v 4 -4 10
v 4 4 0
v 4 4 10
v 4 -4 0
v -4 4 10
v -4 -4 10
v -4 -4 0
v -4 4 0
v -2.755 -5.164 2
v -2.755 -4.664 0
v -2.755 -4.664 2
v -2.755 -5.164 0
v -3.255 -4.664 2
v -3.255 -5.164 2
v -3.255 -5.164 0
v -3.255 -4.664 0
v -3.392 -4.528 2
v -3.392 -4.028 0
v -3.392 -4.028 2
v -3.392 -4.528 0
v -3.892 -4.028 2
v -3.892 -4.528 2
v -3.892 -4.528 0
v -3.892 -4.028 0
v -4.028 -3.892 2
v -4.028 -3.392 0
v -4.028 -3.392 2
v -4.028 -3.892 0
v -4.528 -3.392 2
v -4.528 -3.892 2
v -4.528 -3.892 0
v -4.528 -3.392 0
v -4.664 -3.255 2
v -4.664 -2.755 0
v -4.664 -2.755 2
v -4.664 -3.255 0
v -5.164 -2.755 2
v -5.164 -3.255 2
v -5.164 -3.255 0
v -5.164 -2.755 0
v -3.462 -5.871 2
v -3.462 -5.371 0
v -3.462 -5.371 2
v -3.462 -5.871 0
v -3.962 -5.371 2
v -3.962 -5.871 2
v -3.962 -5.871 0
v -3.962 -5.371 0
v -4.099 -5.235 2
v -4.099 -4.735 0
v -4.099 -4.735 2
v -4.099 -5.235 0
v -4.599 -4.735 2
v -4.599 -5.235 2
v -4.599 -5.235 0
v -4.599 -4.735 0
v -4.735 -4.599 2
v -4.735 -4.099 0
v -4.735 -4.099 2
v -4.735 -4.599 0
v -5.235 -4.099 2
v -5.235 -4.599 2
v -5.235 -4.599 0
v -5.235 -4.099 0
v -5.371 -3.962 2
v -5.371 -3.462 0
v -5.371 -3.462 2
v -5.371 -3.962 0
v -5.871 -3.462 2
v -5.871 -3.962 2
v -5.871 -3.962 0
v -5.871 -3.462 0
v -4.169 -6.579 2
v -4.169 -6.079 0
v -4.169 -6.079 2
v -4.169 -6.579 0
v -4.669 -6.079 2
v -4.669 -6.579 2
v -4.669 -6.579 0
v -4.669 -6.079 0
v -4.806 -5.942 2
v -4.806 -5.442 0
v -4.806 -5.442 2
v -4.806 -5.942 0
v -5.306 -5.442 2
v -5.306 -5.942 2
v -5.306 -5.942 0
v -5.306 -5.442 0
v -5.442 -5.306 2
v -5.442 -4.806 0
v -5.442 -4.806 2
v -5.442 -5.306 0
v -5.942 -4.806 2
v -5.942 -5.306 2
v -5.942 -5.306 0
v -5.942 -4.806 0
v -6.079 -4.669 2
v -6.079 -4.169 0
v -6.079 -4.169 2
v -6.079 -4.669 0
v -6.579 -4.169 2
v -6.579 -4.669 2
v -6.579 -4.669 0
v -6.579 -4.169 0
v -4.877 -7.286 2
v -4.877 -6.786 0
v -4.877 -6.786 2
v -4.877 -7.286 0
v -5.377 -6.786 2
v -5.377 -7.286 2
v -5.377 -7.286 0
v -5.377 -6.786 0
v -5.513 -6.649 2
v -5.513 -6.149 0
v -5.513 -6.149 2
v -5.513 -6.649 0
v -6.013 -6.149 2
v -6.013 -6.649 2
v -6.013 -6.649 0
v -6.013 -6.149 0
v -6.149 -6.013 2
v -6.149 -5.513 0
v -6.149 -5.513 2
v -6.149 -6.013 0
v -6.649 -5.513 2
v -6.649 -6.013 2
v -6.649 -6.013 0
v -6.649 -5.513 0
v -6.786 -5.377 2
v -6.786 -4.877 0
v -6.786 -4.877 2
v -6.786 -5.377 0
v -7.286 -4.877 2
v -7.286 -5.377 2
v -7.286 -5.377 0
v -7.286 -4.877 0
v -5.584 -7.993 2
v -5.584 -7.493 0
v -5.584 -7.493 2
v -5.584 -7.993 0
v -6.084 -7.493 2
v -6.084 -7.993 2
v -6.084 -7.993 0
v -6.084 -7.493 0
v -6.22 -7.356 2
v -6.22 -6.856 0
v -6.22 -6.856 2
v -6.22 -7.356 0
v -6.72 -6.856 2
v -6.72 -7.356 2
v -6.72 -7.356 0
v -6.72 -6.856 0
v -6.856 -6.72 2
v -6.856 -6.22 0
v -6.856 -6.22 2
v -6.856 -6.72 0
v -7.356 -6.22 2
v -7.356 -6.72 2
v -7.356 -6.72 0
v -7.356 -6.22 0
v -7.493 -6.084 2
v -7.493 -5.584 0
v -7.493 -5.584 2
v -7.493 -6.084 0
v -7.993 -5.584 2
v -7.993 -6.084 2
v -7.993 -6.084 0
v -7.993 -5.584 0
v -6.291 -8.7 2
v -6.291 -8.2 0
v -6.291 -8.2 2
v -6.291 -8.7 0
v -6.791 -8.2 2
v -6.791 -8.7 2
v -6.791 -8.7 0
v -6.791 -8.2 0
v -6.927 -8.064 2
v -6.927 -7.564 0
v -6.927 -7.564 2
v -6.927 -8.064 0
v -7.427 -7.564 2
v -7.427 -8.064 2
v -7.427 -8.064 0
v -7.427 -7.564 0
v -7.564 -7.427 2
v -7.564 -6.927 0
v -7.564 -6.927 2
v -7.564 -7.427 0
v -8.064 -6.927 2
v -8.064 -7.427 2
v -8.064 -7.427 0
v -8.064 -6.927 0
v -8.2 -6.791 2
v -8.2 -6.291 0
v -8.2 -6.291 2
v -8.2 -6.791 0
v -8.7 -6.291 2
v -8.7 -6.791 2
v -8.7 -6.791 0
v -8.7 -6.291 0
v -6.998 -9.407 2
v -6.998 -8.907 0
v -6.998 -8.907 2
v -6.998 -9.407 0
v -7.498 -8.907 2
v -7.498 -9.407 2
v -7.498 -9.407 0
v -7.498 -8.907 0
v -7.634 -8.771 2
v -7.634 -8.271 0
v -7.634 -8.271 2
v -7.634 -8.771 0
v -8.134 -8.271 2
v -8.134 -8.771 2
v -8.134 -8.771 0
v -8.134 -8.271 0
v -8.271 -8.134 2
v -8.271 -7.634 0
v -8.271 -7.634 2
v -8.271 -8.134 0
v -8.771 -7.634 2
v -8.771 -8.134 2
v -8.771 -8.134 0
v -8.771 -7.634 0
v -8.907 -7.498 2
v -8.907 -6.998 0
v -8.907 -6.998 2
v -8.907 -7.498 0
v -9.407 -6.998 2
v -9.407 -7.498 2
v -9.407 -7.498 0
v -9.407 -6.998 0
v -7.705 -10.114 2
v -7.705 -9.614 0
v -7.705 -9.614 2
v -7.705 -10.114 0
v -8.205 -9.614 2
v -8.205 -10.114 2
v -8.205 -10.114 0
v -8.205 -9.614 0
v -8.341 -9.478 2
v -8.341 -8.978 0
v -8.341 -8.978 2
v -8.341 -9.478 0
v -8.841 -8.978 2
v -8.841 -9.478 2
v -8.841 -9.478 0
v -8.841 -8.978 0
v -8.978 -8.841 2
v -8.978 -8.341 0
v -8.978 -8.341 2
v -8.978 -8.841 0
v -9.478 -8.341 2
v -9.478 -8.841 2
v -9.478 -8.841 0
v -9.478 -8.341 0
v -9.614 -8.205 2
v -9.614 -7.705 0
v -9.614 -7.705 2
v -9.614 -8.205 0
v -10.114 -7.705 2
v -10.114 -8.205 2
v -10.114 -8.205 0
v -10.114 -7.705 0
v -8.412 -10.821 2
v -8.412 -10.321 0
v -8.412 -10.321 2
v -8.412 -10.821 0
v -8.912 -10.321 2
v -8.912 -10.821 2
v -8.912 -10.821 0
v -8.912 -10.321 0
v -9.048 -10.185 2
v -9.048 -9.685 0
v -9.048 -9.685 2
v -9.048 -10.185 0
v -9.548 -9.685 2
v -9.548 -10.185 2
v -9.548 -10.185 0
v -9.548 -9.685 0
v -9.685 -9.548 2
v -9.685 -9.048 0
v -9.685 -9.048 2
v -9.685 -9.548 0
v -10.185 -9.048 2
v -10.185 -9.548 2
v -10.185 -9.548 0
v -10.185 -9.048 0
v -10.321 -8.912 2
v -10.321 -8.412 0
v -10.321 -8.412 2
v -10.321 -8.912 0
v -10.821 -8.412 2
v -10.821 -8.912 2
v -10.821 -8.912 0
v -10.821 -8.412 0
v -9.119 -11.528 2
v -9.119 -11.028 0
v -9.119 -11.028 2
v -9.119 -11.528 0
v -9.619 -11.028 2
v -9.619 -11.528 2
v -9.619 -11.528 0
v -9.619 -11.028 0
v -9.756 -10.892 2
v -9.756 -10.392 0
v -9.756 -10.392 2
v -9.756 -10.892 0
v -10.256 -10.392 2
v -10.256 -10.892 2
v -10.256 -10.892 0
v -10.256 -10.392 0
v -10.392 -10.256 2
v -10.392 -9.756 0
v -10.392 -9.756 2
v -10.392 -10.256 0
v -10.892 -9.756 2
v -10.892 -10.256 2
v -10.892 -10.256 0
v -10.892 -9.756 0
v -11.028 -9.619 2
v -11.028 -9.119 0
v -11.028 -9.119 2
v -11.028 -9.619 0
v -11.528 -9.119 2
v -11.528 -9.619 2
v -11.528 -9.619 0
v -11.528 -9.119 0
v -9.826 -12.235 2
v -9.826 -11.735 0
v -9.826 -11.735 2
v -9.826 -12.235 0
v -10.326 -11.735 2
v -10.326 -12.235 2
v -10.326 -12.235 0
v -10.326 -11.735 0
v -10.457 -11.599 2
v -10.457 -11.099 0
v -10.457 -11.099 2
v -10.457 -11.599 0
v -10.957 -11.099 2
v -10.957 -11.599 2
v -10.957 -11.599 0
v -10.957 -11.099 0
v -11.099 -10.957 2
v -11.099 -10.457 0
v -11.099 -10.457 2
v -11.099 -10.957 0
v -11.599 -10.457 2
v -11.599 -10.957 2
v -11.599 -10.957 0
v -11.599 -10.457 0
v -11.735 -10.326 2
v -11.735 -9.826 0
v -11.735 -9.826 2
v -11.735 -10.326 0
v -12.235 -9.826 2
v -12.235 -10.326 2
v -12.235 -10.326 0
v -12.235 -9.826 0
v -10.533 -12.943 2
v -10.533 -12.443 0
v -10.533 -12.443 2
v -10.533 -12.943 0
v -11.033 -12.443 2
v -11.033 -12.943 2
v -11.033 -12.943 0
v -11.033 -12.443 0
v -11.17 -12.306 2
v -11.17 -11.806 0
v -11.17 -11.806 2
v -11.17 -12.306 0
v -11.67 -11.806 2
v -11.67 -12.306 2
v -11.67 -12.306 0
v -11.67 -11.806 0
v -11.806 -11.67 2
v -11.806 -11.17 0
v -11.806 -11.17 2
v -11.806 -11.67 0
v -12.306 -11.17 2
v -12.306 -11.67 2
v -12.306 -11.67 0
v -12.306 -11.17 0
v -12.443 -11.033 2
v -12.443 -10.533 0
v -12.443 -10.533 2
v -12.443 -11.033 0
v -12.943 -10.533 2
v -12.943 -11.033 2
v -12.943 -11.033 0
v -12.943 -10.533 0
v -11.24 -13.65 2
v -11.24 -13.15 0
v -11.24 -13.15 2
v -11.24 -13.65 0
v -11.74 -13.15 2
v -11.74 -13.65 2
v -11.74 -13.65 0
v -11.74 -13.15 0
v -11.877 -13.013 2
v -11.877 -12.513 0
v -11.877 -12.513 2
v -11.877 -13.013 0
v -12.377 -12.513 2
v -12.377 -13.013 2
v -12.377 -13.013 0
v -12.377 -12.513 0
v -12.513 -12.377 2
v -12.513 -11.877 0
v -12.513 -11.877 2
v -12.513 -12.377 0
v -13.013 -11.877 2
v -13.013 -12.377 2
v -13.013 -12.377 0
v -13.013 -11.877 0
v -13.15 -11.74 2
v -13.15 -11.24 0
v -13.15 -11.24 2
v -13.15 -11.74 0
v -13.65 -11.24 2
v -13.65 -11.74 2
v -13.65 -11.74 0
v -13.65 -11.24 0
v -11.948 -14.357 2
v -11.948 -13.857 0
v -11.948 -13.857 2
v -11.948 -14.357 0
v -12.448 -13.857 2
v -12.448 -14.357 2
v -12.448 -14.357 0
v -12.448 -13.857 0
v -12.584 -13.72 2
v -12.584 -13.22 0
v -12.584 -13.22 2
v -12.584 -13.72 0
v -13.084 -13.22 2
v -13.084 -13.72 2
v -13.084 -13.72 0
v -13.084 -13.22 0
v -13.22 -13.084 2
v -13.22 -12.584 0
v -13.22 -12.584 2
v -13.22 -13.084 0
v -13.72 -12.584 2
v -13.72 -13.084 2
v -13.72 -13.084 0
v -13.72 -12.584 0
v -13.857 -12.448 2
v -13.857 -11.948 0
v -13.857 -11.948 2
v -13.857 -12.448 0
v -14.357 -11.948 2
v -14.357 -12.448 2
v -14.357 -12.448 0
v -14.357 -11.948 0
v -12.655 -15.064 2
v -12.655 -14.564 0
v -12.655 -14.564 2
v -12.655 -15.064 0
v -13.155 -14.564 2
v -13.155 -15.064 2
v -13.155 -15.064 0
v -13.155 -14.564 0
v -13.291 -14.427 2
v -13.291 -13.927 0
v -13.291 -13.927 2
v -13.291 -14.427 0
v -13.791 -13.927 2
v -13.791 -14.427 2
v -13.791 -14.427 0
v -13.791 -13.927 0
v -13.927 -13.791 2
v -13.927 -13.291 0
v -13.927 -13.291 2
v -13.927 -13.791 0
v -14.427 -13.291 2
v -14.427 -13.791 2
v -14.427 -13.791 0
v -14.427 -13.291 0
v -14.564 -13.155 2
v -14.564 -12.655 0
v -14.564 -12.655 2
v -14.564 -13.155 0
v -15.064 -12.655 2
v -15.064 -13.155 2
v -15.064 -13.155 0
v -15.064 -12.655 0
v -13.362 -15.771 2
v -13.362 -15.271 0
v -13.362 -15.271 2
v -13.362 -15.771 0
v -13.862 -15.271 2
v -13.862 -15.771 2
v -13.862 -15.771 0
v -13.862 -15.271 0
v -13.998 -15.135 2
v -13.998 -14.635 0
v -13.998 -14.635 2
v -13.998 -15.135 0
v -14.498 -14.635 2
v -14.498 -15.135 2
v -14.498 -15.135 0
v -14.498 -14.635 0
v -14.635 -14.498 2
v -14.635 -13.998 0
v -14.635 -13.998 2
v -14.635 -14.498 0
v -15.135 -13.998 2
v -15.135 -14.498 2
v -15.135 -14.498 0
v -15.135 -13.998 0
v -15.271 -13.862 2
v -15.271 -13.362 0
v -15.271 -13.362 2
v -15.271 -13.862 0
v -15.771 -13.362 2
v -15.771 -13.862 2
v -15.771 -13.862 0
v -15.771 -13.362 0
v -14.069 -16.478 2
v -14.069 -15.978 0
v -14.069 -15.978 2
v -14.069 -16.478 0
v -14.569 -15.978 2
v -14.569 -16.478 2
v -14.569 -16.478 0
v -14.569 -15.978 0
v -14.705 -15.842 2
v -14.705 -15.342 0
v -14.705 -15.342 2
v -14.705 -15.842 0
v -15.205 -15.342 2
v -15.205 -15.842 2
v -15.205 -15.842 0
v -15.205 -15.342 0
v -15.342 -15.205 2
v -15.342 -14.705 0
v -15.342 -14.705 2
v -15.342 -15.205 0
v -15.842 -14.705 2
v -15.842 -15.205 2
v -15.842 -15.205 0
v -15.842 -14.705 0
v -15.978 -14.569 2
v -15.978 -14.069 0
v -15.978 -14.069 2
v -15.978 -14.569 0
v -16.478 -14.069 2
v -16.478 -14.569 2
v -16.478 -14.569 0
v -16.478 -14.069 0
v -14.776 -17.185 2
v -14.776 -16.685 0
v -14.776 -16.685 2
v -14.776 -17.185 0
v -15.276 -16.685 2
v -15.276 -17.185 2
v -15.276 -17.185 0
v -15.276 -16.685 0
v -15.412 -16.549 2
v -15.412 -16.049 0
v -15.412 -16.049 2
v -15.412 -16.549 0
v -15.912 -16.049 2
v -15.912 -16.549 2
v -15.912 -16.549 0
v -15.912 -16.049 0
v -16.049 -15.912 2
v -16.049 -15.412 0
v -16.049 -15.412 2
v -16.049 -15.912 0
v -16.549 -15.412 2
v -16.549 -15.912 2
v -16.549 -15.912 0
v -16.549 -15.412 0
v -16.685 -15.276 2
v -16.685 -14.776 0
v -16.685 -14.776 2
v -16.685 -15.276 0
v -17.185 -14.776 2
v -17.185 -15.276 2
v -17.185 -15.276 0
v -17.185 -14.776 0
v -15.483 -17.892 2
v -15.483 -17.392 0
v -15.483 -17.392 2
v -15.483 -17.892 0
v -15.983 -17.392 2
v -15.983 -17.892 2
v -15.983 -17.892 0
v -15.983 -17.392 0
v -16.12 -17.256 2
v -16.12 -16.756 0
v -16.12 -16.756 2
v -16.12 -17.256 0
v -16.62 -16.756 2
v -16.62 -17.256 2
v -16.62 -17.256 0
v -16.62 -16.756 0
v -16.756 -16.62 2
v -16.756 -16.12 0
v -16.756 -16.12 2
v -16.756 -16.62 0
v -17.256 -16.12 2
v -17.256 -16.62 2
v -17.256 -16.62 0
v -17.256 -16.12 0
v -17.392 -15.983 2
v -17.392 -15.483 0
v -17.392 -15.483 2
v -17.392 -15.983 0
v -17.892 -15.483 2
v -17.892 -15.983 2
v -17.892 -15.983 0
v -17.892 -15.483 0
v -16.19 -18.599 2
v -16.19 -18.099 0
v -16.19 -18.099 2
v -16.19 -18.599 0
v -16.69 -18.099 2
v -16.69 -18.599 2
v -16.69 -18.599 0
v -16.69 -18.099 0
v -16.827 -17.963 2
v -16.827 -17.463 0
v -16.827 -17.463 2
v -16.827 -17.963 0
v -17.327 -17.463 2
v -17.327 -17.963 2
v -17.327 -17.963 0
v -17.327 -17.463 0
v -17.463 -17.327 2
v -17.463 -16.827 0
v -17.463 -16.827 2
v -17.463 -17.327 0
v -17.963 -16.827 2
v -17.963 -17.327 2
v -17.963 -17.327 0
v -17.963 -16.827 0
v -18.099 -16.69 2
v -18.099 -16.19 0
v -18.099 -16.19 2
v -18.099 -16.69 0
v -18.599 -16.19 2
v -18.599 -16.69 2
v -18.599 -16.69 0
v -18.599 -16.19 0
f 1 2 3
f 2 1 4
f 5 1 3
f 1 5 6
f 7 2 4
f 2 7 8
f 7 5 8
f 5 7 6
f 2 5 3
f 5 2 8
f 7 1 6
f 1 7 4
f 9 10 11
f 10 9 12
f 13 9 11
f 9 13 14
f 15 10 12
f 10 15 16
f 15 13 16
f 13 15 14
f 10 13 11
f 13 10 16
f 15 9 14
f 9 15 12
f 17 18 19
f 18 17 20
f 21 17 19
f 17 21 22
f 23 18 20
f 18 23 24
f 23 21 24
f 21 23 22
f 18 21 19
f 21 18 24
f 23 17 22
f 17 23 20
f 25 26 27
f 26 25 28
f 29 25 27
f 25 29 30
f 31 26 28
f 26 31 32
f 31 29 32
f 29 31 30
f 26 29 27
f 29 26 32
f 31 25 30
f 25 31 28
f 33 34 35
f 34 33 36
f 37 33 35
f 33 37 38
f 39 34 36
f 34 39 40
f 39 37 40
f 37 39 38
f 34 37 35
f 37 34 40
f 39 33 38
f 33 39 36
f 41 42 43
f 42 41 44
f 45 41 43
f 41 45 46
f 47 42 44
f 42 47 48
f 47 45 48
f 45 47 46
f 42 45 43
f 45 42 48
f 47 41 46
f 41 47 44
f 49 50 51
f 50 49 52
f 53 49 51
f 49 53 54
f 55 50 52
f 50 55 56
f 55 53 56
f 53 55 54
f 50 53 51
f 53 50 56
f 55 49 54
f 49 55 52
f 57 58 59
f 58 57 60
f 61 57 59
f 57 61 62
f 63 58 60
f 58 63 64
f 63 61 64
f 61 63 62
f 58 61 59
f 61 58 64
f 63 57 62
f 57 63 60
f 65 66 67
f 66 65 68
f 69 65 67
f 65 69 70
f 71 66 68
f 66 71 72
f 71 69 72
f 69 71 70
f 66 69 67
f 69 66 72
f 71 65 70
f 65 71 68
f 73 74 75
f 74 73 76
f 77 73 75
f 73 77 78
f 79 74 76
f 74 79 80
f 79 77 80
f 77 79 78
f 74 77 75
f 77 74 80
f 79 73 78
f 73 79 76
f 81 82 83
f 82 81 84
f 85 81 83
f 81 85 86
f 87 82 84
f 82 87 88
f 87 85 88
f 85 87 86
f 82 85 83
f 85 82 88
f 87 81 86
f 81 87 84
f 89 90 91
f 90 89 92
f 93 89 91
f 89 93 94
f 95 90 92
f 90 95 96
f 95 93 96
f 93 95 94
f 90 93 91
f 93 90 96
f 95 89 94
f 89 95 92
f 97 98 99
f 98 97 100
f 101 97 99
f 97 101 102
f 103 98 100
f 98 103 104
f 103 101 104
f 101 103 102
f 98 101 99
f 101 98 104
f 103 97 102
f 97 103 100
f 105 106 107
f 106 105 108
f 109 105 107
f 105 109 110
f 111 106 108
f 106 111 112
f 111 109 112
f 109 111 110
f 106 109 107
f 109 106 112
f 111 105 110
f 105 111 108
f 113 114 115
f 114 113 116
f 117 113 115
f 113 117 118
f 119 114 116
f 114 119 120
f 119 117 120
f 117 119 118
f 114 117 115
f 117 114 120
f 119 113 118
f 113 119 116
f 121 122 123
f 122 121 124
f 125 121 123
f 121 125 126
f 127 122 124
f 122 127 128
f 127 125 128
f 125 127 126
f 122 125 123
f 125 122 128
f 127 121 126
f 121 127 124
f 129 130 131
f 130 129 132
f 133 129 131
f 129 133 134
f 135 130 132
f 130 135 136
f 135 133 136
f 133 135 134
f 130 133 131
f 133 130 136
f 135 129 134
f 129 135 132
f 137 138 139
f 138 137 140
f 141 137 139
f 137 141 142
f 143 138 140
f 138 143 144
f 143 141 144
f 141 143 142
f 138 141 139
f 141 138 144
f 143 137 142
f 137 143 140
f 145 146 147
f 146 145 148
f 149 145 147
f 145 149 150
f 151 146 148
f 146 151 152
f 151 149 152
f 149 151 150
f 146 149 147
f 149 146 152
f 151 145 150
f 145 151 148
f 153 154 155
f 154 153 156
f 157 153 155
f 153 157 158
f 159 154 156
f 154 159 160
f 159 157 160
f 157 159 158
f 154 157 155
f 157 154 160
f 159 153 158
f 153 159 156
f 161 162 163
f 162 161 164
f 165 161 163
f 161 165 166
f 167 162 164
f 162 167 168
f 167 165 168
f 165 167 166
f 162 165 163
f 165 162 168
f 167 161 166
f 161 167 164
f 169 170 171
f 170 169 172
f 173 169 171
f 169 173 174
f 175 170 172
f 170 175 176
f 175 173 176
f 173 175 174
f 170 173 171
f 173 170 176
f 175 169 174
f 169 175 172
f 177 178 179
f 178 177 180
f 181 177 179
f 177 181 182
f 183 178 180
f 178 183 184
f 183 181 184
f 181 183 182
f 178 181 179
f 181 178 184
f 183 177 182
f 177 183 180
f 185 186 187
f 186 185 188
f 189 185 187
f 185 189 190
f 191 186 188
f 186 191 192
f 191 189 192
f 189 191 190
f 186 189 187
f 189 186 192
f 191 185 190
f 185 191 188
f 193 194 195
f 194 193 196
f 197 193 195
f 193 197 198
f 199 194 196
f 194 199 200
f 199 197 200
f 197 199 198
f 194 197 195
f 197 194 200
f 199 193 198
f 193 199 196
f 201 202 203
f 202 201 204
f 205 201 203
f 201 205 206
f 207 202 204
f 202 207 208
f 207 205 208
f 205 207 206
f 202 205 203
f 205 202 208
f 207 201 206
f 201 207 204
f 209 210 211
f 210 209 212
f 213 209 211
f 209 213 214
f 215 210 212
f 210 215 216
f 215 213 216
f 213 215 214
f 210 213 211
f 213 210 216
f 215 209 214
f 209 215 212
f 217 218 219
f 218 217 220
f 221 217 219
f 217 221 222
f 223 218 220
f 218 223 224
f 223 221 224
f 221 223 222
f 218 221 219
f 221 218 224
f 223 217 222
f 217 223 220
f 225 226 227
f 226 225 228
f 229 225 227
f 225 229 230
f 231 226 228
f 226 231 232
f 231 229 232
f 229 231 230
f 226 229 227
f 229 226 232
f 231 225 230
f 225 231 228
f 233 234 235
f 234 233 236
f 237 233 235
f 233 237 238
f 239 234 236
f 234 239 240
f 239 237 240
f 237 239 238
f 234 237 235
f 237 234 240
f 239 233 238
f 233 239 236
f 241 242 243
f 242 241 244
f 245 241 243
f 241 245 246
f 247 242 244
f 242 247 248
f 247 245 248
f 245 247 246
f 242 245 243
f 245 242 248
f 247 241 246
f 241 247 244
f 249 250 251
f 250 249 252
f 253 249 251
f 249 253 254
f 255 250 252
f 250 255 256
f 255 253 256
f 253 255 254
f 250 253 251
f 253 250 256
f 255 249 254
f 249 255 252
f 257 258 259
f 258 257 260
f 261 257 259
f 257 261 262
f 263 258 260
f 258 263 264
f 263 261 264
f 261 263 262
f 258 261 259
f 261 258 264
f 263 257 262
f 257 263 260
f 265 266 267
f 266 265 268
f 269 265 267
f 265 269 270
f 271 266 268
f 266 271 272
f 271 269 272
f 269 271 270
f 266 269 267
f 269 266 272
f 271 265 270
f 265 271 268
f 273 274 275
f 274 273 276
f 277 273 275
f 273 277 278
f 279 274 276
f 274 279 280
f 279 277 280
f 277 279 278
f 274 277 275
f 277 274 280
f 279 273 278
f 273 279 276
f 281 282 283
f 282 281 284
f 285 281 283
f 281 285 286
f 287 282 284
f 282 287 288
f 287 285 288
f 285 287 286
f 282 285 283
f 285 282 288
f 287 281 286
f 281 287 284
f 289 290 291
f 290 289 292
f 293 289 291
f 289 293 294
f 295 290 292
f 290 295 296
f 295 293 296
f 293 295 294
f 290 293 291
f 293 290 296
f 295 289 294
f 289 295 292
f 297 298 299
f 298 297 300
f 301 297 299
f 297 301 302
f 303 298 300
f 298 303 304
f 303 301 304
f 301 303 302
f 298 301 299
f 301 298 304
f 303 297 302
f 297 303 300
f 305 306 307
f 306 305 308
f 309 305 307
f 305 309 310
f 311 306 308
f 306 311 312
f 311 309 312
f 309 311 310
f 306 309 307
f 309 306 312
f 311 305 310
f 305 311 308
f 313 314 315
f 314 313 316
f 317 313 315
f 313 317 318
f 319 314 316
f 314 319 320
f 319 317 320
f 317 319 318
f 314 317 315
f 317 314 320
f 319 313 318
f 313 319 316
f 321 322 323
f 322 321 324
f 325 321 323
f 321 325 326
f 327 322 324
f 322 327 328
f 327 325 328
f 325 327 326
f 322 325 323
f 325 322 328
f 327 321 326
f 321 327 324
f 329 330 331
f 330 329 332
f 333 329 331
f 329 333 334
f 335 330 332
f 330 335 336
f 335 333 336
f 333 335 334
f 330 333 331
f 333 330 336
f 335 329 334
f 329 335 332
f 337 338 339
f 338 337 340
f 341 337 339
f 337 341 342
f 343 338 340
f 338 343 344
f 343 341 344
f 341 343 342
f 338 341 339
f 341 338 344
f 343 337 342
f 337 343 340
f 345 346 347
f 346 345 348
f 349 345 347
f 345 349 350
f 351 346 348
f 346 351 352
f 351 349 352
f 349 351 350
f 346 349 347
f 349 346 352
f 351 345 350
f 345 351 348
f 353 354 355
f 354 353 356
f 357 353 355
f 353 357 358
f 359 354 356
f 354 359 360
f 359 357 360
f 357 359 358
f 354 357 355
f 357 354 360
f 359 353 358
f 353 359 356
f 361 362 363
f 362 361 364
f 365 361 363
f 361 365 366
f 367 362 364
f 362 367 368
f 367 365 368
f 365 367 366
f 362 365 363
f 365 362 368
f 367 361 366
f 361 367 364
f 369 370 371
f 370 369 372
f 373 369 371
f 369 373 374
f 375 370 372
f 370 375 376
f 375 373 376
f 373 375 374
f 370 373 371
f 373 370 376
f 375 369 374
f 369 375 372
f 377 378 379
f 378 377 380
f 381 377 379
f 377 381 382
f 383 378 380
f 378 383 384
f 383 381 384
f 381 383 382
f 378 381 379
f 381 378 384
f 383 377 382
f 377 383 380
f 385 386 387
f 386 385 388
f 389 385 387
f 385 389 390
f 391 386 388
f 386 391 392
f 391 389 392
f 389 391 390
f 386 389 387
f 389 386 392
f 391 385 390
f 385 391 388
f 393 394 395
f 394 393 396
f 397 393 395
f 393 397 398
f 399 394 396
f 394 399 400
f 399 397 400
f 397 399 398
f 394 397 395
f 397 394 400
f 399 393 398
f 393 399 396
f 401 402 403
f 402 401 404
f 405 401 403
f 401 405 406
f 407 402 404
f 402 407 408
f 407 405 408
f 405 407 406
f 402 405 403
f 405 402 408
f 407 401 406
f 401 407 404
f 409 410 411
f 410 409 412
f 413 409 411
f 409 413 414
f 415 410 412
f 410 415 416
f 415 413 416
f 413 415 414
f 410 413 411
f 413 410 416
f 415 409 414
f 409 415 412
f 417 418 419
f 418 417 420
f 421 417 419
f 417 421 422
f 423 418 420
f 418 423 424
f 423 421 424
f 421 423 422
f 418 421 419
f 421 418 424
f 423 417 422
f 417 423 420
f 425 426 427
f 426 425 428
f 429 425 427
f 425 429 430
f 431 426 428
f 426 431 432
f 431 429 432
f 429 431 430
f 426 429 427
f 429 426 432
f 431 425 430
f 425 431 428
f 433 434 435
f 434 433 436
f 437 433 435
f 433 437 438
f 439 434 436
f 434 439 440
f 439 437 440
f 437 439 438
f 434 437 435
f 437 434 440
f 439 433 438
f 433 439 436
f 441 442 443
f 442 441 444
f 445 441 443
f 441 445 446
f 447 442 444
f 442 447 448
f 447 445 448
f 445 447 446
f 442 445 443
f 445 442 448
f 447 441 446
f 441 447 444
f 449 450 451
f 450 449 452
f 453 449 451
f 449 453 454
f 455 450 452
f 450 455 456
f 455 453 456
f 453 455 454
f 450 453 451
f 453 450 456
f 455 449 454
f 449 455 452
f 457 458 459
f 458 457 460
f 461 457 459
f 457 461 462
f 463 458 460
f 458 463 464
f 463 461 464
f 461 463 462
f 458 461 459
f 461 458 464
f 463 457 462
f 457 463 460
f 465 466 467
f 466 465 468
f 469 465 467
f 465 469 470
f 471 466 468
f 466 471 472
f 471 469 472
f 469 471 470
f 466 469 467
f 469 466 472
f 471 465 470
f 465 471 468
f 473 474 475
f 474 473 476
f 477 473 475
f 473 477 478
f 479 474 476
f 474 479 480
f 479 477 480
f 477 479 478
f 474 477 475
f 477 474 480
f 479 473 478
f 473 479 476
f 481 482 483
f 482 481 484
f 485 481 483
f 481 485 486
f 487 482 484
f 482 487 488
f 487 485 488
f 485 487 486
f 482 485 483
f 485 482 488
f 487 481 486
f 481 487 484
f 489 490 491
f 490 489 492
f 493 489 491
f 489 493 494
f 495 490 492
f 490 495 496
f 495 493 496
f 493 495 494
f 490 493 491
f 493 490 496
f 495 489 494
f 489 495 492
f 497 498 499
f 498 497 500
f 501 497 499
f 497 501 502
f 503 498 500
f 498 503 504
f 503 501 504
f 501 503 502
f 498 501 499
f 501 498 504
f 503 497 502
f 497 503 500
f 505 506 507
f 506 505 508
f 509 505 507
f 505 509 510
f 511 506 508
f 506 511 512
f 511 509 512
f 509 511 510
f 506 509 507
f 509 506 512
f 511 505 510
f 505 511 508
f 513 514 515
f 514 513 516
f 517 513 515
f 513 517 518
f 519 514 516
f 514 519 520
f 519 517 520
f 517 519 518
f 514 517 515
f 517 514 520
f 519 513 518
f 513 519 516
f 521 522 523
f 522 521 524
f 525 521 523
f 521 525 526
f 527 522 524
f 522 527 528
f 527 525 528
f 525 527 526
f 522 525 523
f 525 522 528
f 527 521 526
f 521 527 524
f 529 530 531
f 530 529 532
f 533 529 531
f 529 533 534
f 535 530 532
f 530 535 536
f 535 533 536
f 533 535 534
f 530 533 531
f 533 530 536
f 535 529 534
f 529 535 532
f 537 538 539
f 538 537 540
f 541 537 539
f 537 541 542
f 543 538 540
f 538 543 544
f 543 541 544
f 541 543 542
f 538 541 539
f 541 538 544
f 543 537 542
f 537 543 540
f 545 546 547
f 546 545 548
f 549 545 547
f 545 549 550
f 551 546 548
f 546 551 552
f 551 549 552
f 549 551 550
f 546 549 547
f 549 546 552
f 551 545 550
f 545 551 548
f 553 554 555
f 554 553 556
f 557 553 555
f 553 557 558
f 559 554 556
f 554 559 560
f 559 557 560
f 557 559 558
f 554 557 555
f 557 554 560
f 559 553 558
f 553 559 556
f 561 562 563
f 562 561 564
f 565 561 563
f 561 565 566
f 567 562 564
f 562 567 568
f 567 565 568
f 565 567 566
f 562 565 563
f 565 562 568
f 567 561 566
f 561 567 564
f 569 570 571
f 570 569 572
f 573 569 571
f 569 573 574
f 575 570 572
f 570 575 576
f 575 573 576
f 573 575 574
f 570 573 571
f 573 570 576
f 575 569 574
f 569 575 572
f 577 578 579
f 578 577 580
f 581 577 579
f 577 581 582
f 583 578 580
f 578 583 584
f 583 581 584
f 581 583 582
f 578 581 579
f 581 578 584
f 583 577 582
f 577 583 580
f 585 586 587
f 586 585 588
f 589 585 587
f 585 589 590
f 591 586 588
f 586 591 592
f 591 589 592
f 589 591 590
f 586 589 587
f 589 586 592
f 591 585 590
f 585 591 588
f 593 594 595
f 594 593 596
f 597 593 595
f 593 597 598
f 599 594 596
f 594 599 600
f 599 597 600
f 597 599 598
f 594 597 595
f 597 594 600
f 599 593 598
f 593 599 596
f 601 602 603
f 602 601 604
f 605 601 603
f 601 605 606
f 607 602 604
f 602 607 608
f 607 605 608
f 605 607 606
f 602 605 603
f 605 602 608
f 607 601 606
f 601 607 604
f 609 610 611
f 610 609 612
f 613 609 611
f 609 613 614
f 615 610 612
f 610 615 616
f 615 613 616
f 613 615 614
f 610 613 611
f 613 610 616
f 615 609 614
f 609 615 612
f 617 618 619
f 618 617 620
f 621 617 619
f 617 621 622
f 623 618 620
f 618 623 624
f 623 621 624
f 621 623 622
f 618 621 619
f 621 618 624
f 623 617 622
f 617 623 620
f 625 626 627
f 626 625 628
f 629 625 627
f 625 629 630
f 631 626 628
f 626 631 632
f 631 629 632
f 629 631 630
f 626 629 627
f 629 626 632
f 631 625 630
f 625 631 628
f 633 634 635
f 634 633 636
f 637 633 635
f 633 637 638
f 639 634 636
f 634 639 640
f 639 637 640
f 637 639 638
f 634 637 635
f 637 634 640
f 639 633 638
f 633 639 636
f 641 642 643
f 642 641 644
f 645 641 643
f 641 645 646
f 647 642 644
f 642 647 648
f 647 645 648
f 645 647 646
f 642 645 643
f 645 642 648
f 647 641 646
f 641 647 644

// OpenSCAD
translate([0, 0, 5]) color([0,1,0,0.9]) cube([8, 8, 10], center=true);
translate([-3.005, -4.914, 1]) color([1,0,0]) cube([0.5, 0.5, 2], center=true);
translate([-3.642, -4.278, 1]) color([1,0,0]) cube([0.5, 0.5, 2], center=true);
translate([-4.278, -3.642, 1]) color([1,0,0]) cube([0.5, 0.5, 2], center=true);
translate([-4.914, -3.005, 1]) color([1,0,0]) cube([0.5, 0.5, 2], center=true);
translate([-3.712, -5.621, 1]) color([1,0,0]) cube([0.5, 0.5, 2], center=true);
translate([-4.349, -4.985, 1]) color([1,0,0]) cube([0.5, 0.5, 2], center=true);
translate([-4.985, -4.349, 1]) color([1,0,0]) cube([0.5, 0.5, 2], center=true);
translate([-5.621, -3.712, 1]) color([1,0,0]) cube([0.5, 0.5, 2], center=true);
translate([-4.419, -6.329, 1]) color([1,0,0]) cube([0.5, 0.5, 2], center=true);
translate([-5.056, -5.692, 1]) color([1,0,0]) cube([0.5, 0.5, 2], center=true);
translate([-5.692, -5.056, 1]) color([1,0,0]) cube([0.5, 0.5, 2], center=true);
translate([-6.329, -4.419, 1]) color([1,0,0]) cube([0.5, 0.5, 2], center=true);
translate([-5.127, -7.036, 1]) color([1,0,0]) cube([0.5, 0.5, 2], center=true);
translate([-5.763, -6.399, 1]) color([1,0,0]) cube([0.5, 0.5, 2], center=true);
translate([-6.399, -5.763, 1]) color([1,0,0]) cube([0.5, 0.5, 2], center=true);
translate([-7.036, -5.127, 1]) color([1,0,0]) cube([0.5, 0.5, 2], center=true);
translate([-5.834, -7.743, 1]) color([1,0,0]) cube([0.5, 0.5, 2], center=true);
translate([-6.47, -7.106, 1]) color([1,0,0]) cube([0.5, 0.5, 2], center=true);
translate([-7.106, -6.47, 1]) color([1,0,0]) cube([0.5, 0.5, 2], center=true);
translate([-7.743, -5.834, 1]) color([1,0,0]) cube([0.5, 0.5, 2], center=true);
translate([-6.541, -8.45, 1]) color([1,0,0]) cube([0.5, 0.5, 2], center=true);
translate([-7.177, -7.814, 1]) color([1,0,0]) cube([0.5, 0.5, 2], center=true);
translate([-7.814, -7.177, 1]) color([1,0,0]) cube([0.5, 0.5, 2], center=true);
translate([-8.45, -6.541, 1]) color([1,0,0]) cube([0.5, 0.5, 2], center=true);
translate([-7.248, -9.157, 1]) color([1,0,0]) cube([0.5, 0.5, 2], center=true);
translate([-7.884, -8.521, 1]) color([1,0,0]) cube([0.5, 0.5, 2], center=true);
translate([-8.521, -7.884, 1]) color([1,0,0]) cube([0.5, 0.5, 2], center=true);
translate([-9.157, -7.248, 1]) color([1,0,0]) cube([0.5, 0.5, 2], center=true);
translate([-7.955, -9.864, 1]) color([1,0,0]) cube([0.5, 0.5, 2], center=true);
translate([-8.591, -9.228, 1]) color([1,0,0]) cube([0.5, 0.5, 2], center=true);
translate([-9.228, -8.591, 1]) color([1,0,0]) cube([0.5, 0.5, 2], center=true);
translate([-9.864, -7.955, 1]) color([1,0,0]) cube([0.5, 0.5, 2], center=true);
translate([-8.662, -10.571, 1]) color([1,0,0]) cube([0.5, 0.5, 2], center=true);
translate([-9.298, -9.935, 1]) color([1,0,0]) cube([0.5, 0.5, 2], center=true);
translate([-9.935, -9.298, 1]) color([1,0,0]) cube([0.5, 0.5, 2], center=true);
translate([-10.571, -8.662, 1]) color([1,0,0]) cube([0.5, 0.5, 2], center=true);
translate([-9.369, -11.278, 1]) color([1,0,0]) cube([0.5, 0.5, 2], center=true);
translate([-10.006, -10.642, 1]) color([1,0,0]) cube([0.5, 0.5, 2], center=true);
translate([-10.642, -10.006, 1]) color([1,0,0]) cube([0.5, 0.5, 2], center=true);
translate([-11.278, -9.369, 1]) color([1,0,0]) cube([0.5, 0.5, 2], center=true);
translate([-10.076, -11.985, 1]) color([1,0,0]) cube([0.5, 0.5, 2], center=true);
translate([-10.707, -11.349, 1]) color([1,0,0]) cube([0.5, 0.5, 2], center=true);
translate([-11.349, -10.707, 1]) color([1,0,0]) cube([0.5, 0.5, 2], center=true);
translate([-11.985, -10.076, 1]) color([1,0,0]) cube([0.5, 0.5, 2], center=true);
translate([-10.783, -12.693, 1]) color([1,0,0]) cube([0.5, 0.5, 2], center=true);
translate([-11.42, -12.056, 1]) color([1,0,0]) cube([0.5, 0.5, 2], center=true);
translate([-12.056, -11.42, 1]) color([1,0,0]) cube([0.5, 0.5, 2], center=true);
translate([-12.693, -10.783, 1]) color([1,0,0]) cube([0.5, 0.5, 2], center=true);
translate([-11.49, -13.4, 1]) color([1,0,0]) cube([0.5, 0.5, 2], center=true);
translate([-12.127, -12.763, 1]) color([1,0,0]) cube([0.5, 0.5, 2], center=true);
translate([-12.763, -12.127, 1]) color([1,0,0]) cube([0.5, 0.5, 2], center=true);
translate([-13.4, -11.49, 1]) color([1,0,0]) cube([0.5, 0.5, 2], center=true);
translate([-12.198, -14.107, 1]) color([1,0,0]) cube([0.5, 0.5, 2], center=true);
translate([-12.834, -13.47, 1]) color([1,0,0]) cube([0.5, 0.5, 2], center=true);
translate([-13.47, -12.834, 1]) color([1,0,0]) cube([0.5, 0.5, 2], center=true);
translate([-14.107, -12.198, 1]) color([1,0,0]) cube([0.5, 0.5, 2], center=true);
translate([-12.905, -14.814, 1]) color([1,0,0]) cube([0.5, 0.5, 2], center=true);
translate([-13.541, -14.177, 1]) color([1,0,0]) cube([0.5, 0.5, 2], center=true);
translate([-14.177, -13.541, 1]) color([1,0,0]) cube([0.5, 0.5, 2], center=true);
translate([-14.814, -12.905, 1]) color([1,0,0]) cube([0.5, 0.5, 2], center=true);
translate([-13.612, -15.521, 1]) color([1,0,0]) cube([0.5, 0.5, 2], center=true);
translate([-14.248, -14.885, 1]) color([1,0,0]) cube([0.5, 0.5, 2], center=true);
translate([-14.885, -14.248, 1]) color([1,0,0]) cube([0.5, 0.5, 2], center=true);
translate([-15.521, -13.612, 1]) color([1,0,0]) cube([0.5, 0.5, 2], center=true);
translate([-14.319, -16.228, 1]) color([1,0,0]) cube([0.5, 0.5, 2], center=true);
translate([-14.955, -15.592, 1]) color([1,0,0]) cube([0.5, 0.5, 2], center=true);
translate([-15.592, -14.955, 1]) color([1,0,0]) cube([0.5, 0.5, 2], center=true);
translate([-16.228, -14.319, 1]) color([1,0,0]) cube([0.5, 0.5, 2], center=true);
translate([-15.026, -16.935, 1]) color([1,0,0]) cube([0.5, 0.5, 2], center=true);
translate([-15.662, -16.299, 1]) color([1,0,0]) cube([0.5, 0.5, 2], center=true);
translate([-16.299, -15.662, 1]) color([1,0,0]) cube([0.5, 0.5, 2], center=true);
translate([-16.935, -15.026, 1]) color([1,0,0]) cube([0.5, 0.5, 2], center=true);
translate([-15.733, -17.642, 1]) color([1,0,0]) cube([0.5, 0.5, 2], center=true);
translate([-16.37, -17.006, 1]) color([1,0,0]) cube([0.5, 0.5, 2], center=true);
translate([-17.006, -16.37, 1]) color([1,0,0]) cube([0.5, 0.5, 2], center=true);
translate([-17.642, -15.733, 1]) color([1,0,0]) cube([0.5, 0.5, 2], center=true);
translate([-16.44, -18.349, 1]) color([1,0,0]) cube([0.5, 0.5, 2], center=true);
translate([-17.077, -17.713, 1]) color([1,0,0]) cube([0.5, 0.5, 2], center=true);
translate([-17.713, -17.077, 1]) color([1,0,0]) cube([0.5, 0.5, 2], center=true);
translate([-18.349, -16.44, 1]) color([1,0,0]) cube([0.5, 0.5, 2], center=true);
